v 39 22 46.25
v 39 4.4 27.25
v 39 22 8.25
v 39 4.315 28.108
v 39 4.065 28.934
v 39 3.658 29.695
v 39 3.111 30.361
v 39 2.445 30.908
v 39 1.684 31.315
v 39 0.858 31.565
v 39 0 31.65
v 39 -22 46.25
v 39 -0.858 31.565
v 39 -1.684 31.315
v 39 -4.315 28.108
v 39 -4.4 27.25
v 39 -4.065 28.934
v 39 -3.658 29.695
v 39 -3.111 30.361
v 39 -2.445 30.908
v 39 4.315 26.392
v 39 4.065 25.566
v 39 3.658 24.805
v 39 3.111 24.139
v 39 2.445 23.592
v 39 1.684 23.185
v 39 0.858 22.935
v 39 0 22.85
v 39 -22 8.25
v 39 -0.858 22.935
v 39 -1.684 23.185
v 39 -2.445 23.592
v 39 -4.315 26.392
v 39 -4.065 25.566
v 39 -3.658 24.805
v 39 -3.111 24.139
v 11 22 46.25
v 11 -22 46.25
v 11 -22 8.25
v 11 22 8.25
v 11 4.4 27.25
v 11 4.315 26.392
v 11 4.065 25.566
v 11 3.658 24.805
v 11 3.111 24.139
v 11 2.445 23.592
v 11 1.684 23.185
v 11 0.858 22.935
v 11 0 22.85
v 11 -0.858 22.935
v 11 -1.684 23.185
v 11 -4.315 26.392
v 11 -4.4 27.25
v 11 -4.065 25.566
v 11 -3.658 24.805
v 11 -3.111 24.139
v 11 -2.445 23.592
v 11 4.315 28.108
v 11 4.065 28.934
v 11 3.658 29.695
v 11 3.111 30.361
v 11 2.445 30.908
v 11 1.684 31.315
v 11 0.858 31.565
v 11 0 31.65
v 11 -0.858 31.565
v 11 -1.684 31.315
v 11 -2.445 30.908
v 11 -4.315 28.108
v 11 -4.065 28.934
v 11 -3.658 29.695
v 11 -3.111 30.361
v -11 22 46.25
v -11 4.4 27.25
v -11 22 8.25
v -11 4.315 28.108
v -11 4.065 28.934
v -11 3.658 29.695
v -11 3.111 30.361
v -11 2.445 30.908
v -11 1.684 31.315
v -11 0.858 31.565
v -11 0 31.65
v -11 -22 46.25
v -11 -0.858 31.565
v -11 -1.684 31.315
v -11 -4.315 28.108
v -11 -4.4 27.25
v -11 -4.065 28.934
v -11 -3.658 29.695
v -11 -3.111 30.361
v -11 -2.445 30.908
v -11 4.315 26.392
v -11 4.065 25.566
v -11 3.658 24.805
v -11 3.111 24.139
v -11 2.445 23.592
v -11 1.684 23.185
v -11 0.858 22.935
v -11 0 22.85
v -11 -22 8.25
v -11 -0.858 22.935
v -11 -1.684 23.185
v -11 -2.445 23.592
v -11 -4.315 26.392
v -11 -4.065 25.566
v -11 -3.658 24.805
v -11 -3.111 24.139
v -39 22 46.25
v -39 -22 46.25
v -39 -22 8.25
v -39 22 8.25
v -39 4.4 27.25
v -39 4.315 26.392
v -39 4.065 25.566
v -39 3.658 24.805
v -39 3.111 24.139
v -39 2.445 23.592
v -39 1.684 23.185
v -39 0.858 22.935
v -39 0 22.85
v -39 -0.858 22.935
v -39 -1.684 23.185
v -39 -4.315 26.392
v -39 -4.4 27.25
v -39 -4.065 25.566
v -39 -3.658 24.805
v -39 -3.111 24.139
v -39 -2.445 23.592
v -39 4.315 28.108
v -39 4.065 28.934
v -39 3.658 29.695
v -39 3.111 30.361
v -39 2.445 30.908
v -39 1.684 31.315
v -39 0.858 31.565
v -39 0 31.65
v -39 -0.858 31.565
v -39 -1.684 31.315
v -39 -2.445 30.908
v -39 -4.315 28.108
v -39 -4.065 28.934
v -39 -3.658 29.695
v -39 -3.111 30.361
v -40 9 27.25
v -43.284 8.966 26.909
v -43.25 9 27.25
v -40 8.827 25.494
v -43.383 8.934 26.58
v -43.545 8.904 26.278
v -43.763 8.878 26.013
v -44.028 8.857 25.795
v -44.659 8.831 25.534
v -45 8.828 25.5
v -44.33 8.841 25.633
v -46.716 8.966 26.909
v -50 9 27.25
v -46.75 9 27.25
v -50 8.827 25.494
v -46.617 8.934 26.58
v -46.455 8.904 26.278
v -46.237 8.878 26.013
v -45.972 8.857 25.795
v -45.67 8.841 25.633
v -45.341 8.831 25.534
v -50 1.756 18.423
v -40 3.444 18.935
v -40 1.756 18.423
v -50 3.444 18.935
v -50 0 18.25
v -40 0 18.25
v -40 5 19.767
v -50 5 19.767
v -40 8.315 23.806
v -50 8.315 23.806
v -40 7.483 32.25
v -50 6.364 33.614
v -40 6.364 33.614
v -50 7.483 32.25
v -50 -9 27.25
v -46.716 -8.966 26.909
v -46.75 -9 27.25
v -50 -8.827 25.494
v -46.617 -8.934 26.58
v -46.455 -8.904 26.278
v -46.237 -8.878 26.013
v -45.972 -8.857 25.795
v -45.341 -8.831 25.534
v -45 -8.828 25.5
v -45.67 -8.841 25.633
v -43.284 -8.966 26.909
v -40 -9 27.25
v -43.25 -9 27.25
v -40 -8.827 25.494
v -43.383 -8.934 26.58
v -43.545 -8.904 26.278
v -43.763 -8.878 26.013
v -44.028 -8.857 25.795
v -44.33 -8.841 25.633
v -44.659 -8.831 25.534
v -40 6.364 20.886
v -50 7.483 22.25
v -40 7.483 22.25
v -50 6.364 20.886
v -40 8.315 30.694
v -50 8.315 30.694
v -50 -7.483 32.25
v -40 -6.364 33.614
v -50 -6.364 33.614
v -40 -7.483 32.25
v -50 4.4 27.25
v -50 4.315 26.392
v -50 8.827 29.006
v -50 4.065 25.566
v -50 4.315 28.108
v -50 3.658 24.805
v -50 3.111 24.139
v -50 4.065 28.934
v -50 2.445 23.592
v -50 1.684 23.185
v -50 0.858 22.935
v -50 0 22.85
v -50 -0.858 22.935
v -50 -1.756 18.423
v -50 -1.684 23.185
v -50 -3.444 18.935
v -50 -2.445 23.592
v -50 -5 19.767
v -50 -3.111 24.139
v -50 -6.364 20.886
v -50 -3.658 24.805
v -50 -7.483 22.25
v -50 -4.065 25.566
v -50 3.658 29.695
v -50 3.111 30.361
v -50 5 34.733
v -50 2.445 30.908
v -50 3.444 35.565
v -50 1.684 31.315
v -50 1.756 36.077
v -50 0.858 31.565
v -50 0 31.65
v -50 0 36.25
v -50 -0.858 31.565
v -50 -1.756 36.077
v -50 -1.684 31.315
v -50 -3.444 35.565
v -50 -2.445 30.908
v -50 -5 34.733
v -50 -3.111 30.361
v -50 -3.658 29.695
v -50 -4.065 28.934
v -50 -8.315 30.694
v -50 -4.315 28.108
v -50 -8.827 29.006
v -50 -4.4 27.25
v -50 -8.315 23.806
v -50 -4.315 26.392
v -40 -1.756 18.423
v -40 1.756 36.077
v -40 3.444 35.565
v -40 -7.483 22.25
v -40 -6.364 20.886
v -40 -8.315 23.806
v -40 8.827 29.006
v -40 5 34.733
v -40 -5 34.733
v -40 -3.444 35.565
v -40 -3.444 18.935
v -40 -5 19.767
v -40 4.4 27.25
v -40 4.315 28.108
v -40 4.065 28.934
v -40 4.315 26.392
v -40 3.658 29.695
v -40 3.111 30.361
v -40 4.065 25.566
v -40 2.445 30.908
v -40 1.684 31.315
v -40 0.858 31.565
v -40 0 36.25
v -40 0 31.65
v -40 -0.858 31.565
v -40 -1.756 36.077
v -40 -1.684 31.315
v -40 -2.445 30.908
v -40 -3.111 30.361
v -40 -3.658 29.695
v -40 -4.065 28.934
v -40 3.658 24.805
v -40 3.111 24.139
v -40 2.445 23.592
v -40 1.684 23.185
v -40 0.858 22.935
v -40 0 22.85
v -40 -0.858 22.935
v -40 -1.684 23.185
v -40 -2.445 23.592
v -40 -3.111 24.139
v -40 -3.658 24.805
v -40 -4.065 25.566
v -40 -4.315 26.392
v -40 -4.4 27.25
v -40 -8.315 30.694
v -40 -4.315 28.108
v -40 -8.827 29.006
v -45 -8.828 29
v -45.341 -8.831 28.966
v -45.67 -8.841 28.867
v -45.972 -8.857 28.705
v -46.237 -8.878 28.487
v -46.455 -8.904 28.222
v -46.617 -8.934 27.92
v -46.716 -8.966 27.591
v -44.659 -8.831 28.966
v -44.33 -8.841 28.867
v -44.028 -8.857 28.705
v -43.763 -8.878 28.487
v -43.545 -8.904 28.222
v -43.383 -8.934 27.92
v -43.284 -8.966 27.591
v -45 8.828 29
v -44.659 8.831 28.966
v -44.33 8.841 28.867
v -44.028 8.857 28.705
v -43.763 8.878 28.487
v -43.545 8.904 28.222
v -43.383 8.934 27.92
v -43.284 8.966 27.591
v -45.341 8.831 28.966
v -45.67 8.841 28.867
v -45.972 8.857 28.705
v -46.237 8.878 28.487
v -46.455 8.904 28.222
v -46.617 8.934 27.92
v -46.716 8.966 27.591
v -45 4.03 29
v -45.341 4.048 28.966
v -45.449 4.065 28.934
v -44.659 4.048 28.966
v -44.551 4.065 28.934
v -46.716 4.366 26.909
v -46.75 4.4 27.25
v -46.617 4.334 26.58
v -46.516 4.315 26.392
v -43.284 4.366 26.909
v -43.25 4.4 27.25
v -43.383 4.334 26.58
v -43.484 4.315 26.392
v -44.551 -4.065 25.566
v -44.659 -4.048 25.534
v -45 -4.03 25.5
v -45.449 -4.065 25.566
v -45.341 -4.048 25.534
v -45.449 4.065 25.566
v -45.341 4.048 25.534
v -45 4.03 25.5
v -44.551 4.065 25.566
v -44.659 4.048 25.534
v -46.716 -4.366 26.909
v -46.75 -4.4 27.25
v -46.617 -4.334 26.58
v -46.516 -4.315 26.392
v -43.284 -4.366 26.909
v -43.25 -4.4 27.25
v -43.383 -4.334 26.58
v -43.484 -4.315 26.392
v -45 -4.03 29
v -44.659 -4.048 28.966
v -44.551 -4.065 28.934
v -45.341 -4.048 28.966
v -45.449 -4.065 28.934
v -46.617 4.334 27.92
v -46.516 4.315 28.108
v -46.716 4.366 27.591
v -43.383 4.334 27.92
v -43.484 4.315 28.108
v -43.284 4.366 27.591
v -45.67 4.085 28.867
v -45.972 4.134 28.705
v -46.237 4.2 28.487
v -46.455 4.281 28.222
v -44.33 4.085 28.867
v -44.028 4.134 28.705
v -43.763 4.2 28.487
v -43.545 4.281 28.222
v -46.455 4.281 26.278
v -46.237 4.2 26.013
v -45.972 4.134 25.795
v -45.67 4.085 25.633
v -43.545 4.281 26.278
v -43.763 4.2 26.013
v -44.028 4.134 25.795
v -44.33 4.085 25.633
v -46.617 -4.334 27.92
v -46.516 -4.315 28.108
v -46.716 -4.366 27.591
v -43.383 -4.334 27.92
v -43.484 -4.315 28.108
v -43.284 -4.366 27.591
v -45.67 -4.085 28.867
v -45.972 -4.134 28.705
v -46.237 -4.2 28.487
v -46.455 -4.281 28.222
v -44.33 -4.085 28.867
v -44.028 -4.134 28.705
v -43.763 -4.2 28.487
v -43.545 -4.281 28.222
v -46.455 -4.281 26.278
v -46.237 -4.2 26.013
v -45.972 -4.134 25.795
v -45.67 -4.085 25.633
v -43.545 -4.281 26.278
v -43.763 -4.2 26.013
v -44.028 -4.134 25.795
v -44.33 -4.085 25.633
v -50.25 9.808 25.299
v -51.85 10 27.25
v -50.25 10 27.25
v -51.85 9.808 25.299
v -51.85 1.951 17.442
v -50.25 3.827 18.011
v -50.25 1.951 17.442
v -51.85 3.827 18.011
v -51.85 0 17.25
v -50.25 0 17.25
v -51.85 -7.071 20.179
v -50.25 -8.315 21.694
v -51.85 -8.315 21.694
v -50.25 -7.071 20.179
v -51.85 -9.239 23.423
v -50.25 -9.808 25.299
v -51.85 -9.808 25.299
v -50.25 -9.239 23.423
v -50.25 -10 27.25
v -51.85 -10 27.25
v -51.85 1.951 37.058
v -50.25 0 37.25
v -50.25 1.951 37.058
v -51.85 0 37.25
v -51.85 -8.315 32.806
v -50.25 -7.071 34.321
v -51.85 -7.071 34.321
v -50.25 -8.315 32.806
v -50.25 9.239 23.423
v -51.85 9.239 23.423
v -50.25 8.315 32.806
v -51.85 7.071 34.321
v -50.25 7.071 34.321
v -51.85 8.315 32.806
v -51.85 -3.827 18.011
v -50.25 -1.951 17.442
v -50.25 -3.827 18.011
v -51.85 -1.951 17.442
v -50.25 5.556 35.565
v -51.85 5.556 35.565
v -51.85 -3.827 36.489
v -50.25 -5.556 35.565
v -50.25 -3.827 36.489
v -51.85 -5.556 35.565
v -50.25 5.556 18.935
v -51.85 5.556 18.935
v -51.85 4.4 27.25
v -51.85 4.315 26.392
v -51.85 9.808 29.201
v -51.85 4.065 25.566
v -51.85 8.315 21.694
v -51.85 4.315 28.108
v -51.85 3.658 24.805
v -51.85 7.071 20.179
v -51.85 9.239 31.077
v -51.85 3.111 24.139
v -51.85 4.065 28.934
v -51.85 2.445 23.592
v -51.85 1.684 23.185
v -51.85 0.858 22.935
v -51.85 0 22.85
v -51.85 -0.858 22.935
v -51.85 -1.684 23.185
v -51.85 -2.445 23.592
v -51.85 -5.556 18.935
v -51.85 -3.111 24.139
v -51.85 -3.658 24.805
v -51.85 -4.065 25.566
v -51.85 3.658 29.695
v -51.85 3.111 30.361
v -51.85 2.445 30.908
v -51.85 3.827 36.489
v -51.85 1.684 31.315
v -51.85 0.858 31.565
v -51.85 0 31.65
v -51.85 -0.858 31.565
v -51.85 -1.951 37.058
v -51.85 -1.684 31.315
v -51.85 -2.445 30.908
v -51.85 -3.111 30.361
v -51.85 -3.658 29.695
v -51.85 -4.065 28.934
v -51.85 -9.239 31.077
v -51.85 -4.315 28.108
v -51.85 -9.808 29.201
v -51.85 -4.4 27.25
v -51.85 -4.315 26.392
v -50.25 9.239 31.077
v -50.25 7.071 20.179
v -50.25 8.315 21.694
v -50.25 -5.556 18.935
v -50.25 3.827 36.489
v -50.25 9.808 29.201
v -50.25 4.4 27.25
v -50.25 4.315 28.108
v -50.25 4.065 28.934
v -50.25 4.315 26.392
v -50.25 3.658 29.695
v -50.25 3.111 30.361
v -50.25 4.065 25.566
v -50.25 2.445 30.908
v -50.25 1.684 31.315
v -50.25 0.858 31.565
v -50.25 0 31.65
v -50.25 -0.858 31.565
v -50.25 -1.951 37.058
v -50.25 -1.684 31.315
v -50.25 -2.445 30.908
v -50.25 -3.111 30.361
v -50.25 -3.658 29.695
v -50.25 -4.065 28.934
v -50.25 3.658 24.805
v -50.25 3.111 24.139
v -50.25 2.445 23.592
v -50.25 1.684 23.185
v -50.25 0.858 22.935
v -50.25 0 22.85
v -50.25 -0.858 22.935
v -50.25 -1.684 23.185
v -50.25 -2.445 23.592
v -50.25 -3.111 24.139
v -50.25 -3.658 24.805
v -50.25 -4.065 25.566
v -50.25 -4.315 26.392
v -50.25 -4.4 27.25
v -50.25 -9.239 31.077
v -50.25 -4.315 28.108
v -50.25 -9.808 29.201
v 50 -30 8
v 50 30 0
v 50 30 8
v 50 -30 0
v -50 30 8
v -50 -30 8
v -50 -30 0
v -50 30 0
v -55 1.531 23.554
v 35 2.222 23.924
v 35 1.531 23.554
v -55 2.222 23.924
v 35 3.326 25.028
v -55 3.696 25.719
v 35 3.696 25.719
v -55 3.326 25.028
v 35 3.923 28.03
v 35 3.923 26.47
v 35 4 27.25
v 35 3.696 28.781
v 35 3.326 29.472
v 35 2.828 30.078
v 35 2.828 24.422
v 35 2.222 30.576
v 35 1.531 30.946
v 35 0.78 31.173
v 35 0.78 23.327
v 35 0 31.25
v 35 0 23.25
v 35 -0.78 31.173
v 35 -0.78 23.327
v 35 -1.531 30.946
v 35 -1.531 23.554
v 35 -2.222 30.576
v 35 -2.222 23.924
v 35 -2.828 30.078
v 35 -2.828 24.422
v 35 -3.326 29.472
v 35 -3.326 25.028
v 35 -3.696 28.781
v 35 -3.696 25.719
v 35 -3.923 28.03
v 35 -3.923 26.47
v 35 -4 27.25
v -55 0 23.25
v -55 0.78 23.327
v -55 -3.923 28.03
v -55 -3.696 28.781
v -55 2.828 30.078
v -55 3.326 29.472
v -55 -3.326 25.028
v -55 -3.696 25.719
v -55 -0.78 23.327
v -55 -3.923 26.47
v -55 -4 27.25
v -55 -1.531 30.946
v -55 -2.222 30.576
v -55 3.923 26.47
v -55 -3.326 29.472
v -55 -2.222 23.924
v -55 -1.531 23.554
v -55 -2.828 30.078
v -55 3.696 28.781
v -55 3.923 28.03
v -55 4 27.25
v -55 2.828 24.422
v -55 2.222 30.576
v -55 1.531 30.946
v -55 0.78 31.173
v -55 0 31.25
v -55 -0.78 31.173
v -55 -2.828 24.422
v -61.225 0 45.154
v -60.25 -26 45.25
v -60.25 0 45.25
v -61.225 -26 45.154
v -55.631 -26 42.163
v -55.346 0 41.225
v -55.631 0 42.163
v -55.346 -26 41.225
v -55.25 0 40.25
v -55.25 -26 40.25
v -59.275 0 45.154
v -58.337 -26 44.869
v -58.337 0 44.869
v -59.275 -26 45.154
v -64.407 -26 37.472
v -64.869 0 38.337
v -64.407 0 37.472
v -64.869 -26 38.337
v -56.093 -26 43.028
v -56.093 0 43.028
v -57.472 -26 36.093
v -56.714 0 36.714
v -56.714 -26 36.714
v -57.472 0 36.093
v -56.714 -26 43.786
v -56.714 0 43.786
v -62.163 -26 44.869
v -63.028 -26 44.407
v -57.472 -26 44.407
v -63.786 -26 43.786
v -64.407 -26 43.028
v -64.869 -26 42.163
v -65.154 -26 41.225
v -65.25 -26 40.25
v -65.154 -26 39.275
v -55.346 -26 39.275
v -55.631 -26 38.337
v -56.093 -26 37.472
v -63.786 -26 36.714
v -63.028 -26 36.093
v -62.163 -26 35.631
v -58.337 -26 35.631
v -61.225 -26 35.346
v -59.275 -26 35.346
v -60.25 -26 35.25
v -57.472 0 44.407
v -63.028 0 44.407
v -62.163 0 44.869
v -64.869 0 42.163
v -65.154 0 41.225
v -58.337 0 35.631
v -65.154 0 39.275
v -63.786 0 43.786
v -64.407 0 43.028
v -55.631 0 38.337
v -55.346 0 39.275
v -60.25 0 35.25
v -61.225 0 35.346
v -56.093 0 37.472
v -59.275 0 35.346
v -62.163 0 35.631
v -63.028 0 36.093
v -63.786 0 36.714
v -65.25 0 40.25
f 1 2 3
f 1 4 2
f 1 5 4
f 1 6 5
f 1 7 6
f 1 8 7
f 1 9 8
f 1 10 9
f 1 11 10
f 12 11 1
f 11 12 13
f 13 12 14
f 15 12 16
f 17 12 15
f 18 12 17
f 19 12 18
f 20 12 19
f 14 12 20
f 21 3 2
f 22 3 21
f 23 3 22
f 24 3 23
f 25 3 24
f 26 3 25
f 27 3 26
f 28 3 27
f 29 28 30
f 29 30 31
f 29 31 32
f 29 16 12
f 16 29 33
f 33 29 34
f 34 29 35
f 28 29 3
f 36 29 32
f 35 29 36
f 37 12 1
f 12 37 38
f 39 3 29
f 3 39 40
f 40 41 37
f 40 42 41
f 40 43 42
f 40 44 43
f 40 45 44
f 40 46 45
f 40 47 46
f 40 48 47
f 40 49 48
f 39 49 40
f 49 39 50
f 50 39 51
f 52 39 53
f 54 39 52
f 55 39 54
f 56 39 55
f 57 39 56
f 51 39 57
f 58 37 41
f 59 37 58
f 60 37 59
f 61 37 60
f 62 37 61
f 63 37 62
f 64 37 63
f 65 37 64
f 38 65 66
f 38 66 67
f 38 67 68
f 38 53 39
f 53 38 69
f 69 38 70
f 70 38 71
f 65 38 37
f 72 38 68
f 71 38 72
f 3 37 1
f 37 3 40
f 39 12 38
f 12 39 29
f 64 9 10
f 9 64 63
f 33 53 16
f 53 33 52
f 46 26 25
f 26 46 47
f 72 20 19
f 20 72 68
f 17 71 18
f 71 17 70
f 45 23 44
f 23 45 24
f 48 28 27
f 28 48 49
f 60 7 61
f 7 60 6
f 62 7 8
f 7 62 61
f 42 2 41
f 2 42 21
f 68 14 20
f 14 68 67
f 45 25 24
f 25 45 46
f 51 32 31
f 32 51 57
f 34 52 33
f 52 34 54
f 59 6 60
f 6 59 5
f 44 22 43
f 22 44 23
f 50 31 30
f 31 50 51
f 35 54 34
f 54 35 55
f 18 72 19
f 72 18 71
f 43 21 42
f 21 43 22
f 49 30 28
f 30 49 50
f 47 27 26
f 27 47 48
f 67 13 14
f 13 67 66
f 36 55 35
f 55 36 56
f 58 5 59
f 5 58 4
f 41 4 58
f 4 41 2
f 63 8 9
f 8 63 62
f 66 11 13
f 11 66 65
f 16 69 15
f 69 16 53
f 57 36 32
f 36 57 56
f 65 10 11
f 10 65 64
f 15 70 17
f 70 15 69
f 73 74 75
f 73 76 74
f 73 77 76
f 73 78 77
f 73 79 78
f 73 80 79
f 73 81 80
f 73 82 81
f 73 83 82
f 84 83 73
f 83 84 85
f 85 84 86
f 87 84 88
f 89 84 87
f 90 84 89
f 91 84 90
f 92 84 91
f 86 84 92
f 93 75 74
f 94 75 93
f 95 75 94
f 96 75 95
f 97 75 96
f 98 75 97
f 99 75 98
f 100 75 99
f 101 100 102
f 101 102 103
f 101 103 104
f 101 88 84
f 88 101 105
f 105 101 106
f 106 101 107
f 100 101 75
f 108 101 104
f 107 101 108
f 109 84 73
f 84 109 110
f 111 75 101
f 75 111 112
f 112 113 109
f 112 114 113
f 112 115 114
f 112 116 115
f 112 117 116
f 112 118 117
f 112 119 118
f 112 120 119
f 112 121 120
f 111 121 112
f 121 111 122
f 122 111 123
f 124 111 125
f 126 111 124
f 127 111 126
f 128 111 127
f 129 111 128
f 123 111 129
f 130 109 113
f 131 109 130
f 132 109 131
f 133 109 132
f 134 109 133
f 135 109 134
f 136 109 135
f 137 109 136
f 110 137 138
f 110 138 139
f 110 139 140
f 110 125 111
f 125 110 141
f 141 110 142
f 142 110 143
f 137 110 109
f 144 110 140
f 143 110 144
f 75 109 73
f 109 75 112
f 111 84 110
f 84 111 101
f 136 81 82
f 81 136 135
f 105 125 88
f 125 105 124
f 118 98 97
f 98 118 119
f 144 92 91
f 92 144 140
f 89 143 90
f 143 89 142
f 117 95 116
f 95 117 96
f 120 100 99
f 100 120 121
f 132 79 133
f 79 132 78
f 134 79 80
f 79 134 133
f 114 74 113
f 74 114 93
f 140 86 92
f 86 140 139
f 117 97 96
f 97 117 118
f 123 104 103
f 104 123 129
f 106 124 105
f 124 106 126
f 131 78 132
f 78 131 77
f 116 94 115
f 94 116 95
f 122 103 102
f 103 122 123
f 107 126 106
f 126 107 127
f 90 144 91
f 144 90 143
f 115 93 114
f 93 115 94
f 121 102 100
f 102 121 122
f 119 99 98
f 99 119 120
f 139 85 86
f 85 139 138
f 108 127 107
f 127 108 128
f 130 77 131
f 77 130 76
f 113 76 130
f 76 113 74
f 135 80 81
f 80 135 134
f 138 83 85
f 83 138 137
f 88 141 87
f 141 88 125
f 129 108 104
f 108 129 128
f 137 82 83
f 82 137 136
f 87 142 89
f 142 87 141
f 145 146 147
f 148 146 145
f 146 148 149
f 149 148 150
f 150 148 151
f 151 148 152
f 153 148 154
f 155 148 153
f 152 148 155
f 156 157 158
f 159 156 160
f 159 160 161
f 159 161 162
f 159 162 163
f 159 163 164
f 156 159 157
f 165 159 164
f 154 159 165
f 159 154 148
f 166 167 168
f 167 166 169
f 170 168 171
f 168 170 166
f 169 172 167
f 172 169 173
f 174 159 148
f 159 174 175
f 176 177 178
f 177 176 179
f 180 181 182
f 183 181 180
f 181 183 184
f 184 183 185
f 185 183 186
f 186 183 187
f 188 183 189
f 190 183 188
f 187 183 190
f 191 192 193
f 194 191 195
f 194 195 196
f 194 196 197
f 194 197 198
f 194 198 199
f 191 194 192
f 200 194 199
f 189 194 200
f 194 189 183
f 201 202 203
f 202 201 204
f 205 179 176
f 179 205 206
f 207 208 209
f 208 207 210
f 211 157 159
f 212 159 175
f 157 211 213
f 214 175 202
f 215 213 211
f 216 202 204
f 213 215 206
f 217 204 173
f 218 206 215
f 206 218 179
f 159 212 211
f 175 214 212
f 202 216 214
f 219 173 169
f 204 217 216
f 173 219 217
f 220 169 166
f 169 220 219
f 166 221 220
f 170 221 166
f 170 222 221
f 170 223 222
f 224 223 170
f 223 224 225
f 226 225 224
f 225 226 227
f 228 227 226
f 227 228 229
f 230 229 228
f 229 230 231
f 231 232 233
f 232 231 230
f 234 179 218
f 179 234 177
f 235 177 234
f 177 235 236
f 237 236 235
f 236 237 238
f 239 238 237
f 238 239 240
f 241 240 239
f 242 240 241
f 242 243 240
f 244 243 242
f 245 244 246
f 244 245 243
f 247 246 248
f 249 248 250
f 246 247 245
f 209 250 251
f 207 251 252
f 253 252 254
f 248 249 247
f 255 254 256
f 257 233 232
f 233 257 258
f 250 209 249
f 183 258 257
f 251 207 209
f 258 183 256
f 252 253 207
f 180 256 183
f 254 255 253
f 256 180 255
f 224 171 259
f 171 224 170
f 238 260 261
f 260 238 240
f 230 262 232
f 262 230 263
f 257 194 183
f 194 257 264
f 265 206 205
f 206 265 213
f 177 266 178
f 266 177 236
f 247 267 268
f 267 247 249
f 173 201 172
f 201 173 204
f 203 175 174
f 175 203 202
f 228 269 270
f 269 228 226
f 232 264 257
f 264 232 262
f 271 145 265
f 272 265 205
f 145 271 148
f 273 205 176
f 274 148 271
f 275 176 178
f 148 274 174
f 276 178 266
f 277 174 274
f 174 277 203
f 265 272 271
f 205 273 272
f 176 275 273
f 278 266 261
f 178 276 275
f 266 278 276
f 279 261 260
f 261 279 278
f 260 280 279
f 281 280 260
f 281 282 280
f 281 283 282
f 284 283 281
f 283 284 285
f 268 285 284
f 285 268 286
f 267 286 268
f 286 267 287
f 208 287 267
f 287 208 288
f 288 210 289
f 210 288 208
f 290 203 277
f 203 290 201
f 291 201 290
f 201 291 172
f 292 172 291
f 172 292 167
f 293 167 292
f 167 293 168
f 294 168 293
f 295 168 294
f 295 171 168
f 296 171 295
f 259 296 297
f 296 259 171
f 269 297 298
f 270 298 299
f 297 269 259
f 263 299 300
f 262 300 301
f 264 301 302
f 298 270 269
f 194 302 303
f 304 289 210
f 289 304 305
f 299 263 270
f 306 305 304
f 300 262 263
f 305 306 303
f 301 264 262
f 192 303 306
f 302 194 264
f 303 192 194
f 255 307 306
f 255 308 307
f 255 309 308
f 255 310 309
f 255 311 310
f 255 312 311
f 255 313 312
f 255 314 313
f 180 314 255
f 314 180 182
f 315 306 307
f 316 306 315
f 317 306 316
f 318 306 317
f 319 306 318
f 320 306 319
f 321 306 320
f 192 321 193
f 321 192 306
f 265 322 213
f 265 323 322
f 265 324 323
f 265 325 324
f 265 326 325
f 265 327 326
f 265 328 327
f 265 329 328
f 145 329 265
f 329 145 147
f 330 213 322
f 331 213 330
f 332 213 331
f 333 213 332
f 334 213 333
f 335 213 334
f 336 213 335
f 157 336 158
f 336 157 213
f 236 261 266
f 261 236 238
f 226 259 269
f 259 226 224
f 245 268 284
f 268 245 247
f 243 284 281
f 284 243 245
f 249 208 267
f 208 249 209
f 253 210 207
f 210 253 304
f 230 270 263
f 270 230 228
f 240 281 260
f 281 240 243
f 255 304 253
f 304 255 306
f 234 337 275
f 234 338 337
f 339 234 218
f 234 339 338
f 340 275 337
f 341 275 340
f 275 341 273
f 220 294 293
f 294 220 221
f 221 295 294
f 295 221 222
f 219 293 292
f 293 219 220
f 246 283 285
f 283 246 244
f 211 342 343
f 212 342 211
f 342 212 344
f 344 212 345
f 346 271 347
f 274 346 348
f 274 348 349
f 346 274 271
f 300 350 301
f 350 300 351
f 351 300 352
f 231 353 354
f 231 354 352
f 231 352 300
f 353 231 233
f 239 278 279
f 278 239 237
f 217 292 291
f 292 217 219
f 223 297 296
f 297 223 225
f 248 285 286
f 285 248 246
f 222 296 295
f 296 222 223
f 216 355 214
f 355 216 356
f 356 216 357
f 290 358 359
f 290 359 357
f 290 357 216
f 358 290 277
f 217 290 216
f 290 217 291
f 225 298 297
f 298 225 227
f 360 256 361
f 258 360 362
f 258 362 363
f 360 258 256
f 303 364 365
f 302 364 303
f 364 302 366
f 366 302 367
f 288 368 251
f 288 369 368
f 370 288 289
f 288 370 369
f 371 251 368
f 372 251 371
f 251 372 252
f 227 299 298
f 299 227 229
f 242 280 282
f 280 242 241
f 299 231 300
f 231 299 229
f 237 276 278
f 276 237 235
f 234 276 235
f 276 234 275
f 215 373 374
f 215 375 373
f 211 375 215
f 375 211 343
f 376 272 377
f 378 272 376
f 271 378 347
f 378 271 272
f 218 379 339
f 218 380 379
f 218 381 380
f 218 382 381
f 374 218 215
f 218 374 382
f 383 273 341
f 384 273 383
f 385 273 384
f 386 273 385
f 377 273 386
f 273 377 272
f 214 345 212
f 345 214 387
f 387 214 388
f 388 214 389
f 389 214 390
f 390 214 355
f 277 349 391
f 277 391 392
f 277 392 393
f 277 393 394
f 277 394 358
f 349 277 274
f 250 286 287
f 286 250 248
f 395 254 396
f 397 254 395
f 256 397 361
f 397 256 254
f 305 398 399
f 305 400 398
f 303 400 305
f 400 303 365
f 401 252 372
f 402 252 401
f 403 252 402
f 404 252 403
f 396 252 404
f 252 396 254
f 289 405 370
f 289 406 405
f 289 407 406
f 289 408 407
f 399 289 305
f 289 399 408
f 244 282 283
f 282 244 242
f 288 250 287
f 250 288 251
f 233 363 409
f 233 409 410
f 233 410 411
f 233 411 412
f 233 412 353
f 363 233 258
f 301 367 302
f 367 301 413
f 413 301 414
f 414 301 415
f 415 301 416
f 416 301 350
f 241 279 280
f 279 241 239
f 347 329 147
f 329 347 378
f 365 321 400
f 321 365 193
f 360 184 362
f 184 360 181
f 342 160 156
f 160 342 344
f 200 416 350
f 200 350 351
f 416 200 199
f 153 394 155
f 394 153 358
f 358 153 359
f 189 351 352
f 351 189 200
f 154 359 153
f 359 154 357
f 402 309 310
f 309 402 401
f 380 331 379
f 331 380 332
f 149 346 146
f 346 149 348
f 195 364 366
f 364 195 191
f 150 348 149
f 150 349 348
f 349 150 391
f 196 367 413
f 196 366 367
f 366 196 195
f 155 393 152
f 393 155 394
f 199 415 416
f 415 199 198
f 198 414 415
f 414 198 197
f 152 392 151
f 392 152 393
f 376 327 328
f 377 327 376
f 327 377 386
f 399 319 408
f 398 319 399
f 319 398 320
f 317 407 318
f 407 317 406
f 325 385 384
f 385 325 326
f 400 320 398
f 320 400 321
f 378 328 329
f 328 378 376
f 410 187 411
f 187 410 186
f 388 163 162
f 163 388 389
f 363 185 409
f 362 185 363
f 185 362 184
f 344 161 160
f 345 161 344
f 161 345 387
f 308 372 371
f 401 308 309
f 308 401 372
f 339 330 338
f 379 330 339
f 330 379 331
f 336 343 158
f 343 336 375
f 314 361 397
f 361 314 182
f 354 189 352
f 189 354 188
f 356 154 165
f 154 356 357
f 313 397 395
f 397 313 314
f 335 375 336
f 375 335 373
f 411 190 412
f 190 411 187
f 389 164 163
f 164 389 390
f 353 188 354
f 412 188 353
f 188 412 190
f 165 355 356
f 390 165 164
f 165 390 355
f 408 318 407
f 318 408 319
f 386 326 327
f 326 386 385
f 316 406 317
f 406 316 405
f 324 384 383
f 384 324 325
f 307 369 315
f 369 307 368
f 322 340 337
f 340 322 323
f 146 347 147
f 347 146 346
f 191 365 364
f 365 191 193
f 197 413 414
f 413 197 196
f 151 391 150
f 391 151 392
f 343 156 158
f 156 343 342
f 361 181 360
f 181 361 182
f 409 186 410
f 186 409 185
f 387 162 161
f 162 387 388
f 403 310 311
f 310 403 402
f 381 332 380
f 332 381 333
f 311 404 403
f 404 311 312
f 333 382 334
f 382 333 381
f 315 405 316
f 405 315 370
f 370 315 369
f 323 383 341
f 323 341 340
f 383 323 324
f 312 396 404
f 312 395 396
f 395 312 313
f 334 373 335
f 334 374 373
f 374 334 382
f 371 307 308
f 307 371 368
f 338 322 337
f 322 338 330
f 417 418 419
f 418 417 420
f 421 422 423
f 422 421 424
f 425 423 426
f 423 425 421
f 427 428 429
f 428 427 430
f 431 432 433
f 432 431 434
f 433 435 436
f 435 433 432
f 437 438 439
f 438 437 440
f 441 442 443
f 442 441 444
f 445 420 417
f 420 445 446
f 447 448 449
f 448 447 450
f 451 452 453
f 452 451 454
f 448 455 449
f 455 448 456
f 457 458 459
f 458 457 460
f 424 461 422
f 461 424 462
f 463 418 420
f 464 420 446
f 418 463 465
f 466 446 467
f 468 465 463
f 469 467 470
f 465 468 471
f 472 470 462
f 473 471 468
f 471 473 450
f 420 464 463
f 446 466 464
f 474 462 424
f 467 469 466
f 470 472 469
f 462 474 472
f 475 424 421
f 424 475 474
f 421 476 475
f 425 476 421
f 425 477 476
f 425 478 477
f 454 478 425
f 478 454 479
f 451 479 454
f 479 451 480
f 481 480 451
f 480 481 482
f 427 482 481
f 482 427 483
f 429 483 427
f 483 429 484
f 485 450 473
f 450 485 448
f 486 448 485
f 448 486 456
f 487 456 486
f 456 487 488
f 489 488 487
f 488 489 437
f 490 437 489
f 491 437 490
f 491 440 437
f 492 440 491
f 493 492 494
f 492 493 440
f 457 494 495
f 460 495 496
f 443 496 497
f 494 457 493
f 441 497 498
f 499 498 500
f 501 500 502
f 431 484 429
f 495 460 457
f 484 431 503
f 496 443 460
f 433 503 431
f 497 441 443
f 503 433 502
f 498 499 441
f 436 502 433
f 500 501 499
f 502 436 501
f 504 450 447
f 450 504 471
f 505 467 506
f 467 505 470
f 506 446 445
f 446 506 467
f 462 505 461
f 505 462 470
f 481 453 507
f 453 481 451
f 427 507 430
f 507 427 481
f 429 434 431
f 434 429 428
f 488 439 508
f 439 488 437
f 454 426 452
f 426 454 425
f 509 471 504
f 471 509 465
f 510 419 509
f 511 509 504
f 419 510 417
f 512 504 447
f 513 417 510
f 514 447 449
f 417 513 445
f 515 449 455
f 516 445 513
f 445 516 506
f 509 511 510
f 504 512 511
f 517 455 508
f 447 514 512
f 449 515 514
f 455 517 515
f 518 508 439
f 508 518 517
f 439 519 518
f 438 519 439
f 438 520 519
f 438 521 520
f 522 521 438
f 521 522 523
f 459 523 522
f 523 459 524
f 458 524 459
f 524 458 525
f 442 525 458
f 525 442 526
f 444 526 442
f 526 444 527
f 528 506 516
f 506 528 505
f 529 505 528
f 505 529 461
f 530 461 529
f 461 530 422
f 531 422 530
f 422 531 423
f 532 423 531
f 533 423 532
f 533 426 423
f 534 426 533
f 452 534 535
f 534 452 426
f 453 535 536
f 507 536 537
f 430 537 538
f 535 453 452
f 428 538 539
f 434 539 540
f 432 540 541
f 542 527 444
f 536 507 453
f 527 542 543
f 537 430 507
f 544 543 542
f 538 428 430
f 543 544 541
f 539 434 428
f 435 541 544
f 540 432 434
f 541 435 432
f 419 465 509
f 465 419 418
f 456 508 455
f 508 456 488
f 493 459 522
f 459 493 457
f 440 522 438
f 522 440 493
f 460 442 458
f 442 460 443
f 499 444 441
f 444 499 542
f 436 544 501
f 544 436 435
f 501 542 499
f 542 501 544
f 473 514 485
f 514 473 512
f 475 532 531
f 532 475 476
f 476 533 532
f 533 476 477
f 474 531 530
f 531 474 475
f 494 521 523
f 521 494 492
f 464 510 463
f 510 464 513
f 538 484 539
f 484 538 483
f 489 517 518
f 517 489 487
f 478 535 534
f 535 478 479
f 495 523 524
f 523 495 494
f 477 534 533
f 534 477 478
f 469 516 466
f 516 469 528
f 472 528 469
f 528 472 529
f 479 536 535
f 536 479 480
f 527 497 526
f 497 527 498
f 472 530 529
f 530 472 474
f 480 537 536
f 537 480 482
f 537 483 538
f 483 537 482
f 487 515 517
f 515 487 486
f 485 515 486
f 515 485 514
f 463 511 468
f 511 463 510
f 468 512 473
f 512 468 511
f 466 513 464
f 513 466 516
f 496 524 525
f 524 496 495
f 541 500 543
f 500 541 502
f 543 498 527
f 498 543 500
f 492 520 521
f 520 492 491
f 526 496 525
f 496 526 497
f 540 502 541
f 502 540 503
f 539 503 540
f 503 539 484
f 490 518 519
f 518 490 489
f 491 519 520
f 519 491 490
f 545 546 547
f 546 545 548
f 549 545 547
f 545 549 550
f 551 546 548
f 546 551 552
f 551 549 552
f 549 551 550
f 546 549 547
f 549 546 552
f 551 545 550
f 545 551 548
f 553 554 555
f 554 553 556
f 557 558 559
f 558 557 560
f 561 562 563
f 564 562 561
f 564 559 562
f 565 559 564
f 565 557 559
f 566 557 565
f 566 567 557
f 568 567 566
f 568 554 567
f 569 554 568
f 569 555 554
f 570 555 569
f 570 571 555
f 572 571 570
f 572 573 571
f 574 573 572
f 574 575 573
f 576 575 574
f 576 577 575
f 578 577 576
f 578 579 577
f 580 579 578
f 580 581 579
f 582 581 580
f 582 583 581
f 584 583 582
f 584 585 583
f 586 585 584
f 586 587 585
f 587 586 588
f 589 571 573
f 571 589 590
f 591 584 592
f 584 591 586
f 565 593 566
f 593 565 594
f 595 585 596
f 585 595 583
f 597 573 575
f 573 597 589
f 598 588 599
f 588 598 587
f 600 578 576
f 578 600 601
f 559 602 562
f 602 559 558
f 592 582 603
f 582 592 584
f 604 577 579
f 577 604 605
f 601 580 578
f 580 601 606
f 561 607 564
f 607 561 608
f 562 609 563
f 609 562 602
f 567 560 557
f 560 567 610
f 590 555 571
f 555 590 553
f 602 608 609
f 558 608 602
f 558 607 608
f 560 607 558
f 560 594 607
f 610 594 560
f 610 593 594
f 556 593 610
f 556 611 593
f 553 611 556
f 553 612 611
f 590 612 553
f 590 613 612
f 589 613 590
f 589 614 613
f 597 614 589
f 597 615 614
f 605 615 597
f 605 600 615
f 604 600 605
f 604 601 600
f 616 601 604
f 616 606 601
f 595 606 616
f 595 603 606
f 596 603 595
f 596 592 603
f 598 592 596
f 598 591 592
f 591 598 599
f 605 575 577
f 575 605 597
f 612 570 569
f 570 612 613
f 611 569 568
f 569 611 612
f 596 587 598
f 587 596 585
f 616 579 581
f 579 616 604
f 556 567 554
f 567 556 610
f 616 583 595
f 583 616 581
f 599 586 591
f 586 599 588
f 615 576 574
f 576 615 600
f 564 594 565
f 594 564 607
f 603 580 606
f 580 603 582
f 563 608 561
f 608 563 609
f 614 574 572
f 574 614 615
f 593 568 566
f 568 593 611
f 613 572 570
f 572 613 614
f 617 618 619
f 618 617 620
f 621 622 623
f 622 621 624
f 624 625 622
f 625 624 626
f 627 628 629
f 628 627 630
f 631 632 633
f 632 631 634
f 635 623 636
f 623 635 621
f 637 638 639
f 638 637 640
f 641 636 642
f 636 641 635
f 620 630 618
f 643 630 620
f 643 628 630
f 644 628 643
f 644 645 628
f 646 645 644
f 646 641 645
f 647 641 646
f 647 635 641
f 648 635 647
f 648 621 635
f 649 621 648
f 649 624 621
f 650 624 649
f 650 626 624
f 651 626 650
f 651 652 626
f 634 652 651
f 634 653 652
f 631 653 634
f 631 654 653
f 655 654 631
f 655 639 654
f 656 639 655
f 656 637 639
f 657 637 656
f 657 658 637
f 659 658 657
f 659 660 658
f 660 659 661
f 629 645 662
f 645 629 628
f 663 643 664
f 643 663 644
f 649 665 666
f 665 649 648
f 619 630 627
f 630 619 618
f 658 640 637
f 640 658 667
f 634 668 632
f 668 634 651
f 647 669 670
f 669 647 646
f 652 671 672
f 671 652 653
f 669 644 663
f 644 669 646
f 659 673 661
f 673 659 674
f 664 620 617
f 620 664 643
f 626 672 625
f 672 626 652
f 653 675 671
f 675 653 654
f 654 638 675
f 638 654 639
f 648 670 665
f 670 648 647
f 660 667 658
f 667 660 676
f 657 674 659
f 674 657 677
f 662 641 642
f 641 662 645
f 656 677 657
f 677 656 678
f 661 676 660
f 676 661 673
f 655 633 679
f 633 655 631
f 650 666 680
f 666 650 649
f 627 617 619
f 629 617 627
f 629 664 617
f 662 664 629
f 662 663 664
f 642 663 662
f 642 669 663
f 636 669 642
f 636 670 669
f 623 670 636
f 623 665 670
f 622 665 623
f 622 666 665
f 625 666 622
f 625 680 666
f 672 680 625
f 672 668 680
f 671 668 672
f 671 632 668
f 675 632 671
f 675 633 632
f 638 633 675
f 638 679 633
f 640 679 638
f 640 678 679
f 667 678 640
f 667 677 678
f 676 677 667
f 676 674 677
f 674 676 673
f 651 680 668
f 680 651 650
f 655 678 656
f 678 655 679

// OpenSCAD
$fn = 32;

// ------------------------------------------------------------------------
// Machine vise: screw d8, jaws 28 x 38 mm
// Every part is its own module, assembly() places every instance.
// ------------------------------------------------------------------------

// --- part 1 ---
module vise_bed() {
  difference() {
    translate([-50, -30, 0]) cube([100, 60, 8]);
  }
}

// --- part 2 ---
module vise_jaw() {
  difference() {
    translate([-14, -22, 0]) cube([28, 44, 38]);
    translate([0, 0, 19]) rotate([0, 90, 0]) cylinder(h = 30, d = 8.8, center = true);
  }
}

// --- part 3 ---
module vise_screw() {
  translate([0, 0, -45]) cylinder(h = 90, d = 8);
}

// --- part 4 ---
module screw_collar() {
  difference() {
    cylinder(h = 10, d = 18);
    translate([0, 0, -1]) cylinder(h = 12, d = 8.8);
    translate([0, 0, 5]) rotate([90, 0, 0]) cylinder(h = 20, d = 3.5, center = true);
  }
}

// --- part 5 ---
module screw_washer() {
  difference() {
      translate([0, 0, 0]) cylinder(h = 1.6, d = 20);
      translate([0, 0, -1]) cylinder(h = 3.6, d = 8.8);
    }
}

// --- part 6 ---
module vise_handle() {
  cylinder(h = 26, d = 10);
}

// --- assembly ---
module assembly() {
  color([0.80, 0.24, 0.20]) translate([0, 0, 0]) rotate([0, 0, 0]) vise_bed();
  color([0.20, 0.45, 0.75]) translate([25, 0, 8.25]) rotate([0, 0, 0]) vise_jaw();
  color([0.25, 0.62, 0.32]) translate([-25, 0, 8.25]) rotate([0, 0, 0]) vise_jaw();
  color([0.92, 0.70, 0.18]) translate([-10, 0, 27.25]) rotate([0, 90, 0]) vise_screw();
  color([0.58, 0.35, 0.70]) translate([-50, 0, 27.25]) rotate([0, 90, 0]) screw_collar();
  color([0.16, 0.66, 0.66]) translate([-51.85, 0, 27.25]) rotate([0, 90, 0]) screw_washer();
  color([0.85, 0.48, 0.18]) translate([-60.25, 0, 40.25]) rotate([90, 0, 0]) vise_handle();
}

assembly();
